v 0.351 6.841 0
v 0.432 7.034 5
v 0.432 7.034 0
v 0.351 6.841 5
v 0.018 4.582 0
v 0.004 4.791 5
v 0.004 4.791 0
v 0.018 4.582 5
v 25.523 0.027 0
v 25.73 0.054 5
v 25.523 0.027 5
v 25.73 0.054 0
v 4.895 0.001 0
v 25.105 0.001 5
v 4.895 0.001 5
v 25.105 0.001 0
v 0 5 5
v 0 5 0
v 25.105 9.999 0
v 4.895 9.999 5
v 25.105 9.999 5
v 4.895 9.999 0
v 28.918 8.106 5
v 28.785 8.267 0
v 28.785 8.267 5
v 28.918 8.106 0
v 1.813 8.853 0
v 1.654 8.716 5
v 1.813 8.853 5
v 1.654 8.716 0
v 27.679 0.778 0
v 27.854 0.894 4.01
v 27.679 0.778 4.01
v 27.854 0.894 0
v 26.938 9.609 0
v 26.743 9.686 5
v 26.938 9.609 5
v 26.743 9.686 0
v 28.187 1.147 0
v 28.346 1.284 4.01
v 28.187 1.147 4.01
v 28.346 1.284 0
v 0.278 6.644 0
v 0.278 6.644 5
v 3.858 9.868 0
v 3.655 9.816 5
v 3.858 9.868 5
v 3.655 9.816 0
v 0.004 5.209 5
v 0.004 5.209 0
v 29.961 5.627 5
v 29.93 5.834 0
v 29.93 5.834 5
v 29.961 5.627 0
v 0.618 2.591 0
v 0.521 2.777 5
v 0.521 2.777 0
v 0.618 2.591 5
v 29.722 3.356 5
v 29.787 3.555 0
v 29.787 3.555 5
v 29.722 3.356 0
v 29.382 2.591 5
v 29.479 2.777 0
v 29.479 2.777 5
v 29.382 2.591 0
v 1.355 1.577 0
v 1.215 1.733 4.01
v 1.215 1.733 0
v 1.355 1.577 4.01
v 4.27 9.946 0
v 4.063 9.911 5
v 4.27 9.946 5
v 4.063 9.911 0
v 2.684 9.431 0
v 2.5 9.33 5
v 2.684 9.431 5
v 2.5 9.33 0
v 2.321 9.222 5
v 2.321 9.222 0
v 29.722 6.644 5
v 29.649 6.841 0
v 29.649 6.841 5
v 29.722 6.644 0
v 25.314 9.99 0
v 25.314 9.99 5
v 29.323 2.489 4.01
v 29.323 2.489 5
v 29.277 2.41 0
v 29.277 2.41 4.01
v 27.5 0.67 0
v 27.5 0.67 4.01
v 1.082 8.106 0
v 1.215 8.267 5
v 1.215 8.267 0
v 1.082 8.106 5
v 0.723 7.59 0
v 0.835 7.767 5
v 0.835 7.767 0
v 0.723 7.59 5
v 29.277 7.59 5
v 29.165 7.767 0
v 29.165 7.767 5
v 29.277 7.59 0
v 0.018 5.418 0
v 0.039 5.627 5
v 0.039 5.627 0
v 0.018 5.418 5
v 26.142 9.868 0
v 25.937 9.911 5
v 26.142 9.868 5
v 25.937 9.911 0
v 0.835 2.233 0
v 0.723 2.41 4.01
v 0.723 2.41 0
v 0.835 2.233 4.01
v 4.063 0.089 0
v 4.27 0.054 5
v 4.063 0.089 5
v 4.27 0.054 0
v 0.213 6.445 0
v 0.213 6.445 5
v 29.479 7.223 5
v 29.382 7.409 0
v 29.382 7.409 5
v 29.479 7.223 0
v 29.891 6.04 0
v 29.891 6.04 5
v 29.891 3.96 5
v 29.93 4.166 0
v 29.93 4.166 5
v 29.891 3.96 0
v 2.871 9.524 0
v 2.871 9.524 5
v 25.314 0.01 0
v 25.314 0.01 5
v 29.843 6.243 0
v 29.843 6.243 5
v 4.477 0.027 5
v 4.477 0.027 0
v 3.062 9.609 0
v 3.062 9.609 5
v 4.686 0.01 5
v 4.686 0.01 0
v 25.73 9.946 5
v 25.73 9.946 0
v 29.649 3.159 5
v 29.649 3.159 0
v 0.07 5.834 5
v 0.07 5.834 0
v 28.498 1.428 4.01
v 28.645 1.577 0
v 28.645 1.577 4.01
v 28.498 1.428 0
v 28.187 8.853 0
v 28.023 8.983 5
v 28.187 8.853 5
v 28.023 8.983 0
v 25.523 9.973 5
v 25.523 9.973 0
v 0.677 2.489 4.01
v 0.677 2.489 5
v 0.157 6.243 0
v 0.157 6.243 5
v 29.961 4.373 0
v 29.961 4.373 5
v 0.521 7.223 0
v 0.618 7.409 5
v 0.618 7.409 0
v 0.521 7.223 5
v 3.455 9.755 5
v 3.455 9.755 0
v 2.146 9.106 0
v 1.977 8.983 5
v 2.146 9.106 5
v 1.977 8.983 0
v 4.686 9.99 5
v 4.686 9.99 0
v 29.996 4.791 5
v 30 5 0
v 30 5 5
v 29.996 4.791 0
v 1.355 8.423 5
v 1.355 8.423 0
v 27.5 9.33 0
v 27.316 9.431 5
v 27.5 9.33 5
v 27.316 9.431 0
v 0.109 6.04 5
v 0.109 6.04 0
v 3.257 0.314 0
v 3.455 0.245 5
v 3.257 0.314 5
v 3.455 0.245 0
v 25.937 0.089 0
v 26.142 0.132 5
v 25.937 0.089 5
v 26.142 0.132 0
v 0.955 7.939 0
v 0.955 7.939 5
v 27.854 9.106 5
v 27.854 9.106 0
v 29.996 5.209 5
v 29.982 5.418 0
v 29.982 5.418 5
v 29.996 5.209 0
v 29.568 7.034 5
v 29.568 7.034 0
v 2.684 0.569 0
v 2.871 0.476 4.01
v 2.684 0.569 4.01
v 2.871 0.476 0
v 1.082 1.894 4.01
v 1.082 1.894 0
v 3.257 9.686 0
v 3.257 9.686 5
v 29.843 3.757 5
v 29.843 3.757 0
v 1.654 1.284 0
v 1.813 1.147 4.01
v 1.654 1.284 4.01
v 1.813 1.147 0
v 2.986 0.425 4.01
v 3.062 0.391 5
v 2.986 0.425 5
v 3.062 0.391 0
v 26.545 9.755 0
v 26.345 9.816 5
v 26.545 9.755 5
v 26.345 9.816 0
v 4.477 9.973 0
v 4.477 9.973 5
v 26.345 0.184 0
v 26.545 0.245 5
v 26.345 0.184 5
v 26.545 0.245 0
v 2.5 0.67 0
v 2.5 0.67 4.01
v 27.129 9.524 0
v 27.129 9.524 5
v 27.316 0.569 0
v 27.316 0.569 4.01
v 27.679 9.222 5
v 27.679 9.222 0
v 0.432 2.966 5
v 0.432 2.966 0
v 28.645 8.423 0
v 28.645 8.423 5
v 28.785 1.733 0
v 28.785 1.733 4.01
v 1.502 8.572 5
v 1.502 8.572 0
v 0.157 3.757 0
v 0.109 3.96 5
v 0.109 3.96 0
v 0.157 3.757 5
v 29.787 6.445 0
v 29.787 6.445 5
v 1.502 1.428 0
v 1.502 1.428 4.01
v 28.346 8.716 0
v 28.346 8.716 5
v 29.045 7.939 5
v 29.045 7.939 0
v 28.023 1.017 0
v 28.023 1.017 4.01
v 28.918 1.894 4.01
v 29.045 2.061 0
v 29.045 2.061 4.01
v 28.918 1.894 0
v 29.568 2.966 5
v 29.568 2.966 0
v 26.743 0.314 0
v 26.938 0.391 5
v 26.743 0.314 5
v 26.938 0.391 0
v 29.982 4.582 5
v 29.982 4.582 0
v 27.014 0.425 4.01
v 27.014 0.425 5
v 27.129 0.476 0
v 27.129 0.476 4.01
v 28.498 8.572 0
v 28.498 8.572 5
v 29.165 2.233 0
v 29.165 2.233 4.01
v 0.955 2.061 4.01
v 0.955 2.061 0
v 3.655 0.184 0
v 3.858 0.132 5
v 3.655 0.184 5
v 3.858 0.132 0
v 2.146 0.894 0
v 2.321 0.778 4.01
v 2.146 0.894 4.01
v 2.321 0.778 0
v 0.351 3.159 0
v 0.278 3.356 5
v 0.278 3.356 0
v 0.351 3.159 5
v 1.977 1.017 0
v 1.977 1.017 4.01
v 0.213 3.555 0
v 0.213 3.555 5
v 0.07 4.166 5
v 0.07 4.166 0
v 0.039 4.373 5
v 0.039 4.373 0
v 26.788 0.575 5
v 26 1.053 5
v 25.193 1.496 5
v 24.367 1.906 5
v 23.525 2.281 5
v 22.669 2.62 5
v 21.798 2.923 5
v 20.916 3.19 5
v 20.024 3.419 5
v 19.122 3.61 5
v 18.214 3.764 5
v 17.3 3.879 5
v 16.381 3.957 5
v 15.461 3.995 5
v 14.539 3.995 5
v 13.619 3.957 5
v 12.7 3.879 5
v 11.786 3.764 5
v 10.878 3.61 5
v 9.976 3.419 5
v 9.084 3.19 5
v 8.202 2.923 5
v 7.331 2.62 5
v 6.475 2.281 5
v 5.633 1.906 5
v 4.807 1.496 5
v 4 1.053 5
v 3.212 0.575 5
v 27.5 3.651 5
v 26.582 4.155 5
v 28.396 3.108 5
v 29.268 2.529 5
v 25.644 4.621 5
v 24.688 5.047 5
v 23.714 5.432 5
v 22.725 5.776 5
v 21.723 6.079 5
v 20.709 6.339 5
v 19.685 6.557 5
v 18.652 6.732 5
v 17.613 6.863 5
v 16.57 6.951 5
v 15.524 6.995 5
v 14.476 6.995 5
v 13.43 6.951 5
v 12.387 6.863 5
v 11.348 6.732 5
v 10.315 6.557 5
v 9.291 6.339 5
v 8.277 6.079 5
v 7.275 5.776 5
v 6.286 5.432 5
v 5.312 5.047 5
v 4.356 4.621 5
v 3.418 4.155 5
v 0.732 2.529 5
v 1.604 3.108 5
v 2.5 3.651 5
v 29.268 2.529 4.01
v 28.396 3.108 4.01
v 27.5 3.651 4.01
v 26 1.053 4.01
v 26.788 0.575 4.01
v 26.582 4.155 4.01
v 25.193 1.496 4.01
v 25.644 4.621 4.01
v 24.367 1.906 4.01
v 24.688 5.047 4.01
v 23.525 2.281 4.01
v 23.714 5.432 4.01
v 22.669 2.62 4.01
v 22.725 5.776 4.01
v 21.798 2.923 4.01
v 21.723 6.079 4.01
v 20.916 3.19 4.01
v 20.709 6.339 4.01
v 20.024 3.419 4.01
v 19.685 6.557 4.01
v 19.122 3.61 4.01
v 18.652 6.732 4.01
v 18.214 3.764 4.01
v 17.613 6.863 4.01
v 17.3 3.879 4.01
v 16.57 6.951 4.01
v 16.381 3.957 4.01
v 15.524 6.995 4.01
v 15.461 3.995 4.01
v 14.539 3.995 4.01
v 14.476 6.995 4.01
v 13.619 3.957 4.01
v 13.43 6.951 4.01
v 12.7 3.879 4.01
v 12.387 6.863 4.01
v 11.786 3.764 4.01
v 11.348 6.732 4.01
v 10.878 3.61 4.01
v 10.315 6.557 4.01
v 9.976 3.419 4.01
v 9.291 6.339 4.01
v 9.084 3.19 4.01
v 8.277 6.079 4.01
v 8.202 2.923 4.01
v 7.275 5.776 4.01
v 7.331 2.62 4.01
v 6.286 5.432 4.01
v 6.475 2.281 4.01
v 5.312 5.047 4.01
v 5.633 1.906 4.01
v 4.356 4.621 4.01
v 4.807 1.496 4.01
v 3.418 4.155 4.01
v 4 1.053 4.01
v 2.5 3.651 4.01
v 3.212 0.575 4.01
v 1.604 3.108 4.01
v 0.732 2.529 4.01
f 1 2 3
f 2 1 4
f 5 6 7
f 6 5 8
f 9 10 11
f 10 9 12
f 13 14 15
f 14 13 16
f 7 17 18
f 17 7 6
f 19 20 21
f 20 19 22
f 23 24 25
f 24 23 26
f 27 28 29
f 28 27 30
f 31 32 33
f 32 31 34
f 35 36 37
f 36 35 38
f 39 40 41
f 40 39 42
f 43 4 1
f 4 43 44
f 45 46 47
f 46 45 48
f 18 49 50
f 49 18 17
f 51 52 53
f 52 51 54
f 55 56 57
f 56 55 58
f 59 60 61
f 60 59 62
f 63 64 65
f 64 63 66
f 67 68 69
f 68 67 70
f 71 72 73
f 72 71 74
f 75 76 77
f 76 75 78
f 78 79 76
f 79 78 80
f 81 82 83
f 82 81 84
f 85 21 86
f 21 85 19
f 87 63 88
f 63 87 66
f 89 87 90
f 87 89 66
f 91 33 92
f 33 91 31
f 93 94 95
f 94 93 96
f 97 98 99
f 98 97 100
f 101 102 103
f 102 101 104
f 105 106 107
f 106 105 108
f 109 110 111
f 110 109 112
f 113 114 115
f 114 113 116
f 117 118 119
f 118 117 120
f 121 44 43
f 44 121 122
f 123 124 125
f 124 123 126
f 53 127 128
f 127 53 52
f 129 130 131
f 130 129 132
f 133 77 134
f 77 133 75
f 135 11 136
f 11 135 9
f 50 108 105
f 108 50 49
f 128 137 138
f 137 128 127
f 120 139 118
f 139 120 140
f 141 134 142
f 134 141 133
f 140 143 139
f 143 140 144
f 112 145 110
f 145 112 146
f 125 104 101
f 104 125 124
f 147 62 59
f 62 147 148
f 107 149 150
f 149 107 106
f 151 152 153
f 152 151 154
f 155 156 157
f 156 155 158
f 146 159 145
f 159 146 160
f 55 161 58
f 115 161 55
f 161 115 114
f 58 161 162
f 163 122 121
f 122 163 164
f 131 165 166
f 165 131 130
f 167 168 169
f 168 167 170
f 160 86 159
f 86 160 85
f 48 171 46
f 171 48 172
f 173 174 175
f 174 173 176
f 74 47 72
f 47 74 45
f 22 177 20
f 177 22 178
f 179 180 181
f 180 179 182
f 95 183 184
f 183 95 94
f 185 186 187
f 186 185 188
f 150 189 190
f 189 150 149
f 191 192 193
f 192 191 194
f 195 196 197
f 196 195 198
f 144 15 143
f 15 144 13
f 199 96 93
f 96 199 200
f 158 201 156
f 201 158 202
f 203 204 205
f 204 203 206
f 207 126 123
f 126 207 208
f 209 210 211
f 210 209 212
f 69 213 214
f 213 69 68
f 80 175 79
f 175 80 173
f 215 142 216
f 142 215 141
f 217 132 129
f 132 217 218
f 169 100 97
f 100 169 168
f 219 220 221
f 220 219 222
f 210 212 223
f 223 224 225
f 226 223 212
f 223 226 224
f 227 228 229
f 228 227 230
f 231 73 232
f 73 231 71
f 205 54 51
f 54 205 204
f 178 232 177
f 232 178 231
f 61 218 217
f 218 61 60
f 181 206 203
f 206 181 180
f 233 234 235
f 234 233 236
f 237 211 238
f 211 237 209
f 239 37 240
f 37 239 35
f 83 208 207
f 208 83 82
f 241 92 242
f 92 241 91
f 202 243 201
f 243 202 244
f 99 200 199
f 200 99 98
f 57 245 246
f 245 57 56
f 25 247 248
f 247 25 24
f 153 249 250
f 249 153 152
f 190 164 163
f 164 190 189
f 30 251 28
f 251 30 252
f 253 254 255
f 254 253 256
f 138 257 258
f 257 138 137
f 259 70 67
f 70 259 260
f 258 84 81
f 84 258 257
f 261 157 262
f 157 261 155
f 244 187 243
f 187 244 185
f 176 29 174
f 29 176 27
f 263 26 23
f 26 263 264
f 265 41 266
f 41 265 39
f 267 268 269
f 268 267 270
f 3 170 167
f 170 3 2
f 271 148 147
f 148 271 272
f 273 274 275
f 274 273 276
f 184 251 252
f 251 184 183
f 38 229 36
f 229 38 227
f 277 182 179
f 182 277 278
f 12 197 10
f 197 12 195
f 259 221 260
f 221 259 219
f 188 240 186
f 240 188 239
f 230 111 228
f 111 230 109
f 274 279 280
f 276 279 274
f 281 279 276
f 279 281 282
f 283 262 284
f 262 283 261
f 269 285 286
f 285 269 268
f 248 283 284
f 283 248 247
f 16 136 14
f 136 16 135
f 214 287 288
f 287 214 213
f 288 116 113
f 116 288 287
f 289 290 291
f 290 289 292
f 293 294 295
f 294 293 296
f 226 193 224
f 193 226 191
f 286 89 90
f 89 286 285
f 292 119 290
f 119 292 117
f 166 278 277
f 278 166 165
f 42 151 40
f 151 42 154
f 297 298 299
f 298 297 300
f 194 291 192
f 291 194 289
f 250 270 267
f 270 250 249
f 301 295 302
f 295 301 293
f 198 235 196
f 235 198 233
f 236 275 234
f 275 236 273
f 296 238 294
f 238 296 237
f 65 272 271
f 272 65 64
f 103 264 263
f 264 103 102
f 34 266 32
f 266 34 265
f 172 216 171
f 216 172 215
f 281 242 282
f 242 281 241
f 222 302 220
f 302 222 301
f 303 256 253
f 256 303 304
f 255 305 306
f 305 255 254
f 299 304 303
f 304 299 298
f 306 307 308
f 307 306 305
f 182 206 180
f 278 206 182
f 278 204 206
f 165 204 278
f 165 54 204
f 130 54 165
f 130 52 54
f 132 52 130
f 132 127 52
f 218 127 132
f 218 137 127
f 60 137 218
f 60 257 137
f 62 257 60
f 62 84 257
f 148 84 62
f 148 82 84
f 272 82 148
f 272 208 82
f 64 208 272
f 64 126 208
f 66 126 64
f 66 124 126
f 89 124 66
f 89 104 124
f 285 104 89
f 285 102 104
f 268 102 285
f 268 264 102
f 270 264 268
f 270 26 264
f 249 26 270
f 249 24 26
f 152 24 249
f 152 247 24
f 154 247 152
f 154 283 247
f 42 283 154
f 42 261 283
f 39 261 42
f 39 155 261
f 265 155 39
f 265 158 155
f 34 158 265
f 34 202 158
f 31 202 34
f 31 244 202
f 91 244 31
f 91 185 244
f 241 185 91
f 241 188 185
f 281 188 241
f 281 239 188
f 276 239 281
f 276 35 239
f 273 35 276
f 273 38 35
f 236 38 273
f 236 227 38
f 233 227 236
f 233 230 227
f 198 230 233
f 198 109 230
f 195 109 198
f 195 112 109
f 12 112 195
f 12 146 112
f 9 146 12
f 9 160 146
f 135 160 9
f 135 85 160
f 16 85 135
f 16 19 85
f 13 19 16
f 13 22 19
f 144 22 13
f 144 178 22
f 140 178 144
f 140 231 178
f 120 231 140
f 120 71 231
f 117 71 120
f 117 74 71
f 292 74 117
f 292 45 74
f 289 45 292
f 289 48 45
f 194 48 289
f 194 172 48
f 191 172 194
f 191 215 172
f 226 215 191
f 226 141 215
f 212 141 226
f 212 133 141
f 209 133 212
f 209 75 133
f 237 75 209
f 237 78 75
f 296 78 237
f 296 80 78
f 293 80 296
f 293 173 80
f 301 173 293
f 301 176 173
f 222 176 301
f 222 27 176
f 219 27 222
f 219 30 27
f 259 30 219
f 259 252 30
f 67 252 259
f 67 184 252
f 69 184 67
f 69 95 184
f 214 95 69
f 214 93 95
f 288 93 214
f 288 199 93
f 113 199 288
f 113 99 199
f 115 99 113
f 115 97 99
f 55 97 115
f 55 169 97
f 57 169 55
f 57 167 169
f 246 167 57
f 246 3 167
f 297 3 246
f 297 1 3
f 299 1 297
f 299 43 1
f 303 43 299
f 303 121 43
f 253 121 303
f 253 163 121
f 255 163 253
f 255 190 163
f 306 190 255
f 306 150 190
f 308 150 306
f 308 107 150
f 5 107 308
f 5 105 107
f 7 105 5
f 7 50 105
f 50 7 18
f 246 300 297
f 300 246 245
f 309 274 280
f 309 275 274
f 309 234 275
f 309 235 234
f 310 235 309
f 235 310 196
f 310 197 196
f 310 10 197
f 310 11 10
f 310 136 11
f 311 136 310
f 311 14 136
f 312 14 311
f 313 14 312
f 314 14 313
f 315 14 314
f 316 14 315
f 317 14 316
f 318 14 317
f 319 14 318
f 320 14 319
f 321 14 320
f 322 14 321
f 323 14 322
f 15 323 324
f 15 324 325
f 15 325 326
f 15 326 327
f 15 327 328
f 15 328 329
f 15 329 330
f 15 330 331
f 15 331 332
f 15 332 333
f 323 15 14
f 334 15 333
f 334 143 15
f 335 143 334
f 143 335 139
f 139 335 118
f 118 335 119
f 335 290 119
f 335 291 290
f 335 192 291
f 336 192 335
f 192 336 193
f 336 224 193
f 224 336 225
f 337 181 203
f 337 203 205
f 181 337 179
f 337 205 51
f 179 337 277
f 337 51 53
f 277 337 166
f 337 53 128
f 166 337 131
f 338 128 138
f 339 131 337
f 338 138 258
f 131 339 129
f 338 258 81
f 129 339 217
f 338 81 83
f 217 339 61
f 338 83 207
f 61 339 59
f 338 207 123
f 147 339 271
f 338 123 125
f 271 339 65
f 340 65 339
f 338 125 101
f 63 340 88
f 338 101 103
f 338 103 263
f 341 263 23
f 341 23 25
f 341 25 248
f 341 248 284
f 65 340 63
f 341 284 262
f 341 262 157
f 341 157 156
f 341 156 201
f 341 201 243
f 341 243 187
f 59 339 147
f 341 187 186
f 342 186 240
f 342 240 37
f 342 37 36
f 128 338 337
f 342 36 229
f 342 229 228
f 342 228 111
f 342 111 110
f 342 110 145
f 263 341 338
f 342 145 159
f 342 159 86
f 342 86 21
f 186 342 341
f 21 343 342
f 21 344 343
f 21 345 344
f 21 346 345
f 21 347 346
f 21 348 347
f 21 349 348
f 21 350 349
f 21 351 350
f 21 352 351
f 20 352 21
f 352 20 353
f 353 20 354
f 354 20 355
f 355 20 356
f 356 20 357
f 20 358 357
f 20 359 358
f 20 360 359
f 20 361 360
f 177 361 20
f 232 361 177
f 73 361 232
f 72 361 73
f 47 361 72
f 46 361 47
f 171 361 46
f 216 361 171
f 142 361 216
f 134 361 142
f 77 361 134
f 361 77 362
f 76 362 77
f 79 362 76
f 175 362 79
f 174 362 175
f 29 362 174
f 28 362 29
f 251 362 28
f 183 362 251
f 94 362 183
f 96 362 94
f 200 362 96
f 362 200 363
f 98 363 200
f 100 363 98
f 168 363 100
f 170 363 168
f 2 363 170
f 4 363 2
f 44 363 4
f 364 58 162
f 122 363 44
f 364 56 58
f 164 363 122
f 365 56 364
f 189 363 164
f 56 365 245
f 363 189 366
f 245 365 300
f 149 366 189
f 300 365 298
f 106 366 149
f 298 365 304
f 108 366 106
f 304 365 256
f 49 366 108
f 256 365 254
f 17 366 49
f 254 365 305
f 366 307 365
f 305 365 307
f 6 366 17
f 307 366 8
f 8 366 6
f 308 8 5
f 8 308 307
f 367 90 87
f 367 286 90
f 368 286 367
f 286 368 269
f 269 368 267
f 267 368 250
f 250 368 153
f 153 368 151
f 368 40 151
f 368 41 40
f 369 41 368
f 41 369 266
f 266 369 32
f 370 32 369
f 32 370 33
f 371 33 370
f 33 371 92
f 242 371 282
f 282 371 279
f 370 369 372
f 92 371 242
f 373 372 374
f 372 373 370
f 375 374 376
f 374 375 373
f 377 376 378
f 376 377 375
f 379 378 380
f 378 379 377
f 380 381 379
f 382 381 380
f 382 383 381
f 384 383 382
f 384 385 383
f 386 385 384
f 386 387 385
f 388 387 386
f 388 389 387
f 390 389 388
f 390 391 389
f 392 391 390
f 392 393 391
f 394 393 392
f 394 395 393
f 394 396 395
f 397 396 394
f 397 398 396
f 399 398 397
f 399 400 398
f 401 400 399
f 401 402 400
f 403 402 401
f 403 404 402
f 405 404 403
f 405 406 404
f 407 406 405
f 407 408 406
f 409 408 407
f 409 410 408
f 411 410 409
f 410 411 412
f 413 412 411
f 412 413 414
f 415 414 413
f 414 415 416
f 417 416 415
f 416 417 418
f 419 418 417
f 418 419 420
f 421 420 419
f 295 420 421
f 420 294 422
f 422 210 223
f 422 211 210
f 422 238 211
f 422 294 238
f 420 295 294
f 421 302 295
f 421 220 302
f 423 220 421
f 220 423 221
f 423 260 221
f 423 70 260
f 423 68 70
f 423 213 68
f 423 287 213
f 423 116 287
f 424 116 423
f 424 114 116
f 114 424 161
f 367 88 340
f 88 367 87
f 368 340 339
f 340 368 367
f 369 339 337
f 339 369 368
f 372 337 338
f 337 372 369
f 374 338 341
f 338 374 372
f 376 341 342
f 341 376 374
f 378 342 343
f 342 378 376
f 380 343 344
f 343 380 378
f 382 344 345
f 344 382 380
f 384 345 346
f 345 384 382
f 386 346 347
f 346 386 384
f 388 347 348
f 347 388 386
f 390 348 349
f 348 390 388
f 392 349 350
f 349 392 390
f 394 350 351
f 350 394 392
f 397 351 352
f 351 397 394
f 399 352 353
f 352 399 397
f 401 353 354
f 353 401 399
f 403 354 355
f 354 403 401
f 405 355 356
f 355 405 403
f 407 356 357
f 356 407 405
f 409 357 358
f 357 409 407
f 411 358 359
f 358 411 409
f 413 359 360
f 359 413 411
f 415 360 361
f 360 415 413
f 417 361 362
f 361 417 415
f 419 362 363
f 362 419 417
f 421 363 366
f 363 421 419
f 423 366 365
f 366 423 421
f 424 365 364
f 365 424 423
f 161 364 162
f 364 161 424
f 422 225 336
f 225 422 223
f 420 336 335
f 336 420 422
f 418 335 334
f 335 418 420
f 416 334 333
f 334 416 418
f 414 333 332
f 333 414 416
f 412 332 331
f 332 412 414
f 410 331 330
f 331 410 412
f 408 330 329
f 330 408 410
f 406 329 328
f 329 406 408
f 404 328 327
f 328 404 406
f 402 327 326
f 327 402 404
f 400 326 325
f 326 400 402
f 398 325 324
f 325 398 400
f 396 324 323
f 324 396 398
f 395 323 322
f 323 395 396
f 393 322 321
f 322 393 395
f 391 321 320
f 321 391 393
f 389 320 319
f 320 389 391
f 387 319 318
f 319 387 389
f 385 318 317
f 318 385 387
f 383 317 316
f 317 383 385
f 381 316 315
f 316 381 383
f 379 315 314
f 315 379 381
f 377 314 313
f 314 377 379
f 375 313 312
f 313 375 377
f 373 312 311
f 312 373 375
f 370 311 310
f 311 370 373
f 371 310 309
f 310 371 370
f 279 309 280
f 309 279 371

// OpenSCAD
rad = 5;
l=20;
bh=5; // baseheight
hh=1; // holderheight
hr=25; //holder rad
hw=3;  //holder width

$fn=150;

module base(){
  linear_extrude(bh)
  hull() {
    translate([rad,rad,0]) circle(rad);
    translate([l+rad,rad,0]) circle(rad);
  }
}

module holder() {
    linear_extrude(hh)
    difference() { 
        circle(hr);
        circle(hr-hw);
    }
}

difference() {
    base();
    translate([15,-18,bh-hh+0.01]) holder();
}
